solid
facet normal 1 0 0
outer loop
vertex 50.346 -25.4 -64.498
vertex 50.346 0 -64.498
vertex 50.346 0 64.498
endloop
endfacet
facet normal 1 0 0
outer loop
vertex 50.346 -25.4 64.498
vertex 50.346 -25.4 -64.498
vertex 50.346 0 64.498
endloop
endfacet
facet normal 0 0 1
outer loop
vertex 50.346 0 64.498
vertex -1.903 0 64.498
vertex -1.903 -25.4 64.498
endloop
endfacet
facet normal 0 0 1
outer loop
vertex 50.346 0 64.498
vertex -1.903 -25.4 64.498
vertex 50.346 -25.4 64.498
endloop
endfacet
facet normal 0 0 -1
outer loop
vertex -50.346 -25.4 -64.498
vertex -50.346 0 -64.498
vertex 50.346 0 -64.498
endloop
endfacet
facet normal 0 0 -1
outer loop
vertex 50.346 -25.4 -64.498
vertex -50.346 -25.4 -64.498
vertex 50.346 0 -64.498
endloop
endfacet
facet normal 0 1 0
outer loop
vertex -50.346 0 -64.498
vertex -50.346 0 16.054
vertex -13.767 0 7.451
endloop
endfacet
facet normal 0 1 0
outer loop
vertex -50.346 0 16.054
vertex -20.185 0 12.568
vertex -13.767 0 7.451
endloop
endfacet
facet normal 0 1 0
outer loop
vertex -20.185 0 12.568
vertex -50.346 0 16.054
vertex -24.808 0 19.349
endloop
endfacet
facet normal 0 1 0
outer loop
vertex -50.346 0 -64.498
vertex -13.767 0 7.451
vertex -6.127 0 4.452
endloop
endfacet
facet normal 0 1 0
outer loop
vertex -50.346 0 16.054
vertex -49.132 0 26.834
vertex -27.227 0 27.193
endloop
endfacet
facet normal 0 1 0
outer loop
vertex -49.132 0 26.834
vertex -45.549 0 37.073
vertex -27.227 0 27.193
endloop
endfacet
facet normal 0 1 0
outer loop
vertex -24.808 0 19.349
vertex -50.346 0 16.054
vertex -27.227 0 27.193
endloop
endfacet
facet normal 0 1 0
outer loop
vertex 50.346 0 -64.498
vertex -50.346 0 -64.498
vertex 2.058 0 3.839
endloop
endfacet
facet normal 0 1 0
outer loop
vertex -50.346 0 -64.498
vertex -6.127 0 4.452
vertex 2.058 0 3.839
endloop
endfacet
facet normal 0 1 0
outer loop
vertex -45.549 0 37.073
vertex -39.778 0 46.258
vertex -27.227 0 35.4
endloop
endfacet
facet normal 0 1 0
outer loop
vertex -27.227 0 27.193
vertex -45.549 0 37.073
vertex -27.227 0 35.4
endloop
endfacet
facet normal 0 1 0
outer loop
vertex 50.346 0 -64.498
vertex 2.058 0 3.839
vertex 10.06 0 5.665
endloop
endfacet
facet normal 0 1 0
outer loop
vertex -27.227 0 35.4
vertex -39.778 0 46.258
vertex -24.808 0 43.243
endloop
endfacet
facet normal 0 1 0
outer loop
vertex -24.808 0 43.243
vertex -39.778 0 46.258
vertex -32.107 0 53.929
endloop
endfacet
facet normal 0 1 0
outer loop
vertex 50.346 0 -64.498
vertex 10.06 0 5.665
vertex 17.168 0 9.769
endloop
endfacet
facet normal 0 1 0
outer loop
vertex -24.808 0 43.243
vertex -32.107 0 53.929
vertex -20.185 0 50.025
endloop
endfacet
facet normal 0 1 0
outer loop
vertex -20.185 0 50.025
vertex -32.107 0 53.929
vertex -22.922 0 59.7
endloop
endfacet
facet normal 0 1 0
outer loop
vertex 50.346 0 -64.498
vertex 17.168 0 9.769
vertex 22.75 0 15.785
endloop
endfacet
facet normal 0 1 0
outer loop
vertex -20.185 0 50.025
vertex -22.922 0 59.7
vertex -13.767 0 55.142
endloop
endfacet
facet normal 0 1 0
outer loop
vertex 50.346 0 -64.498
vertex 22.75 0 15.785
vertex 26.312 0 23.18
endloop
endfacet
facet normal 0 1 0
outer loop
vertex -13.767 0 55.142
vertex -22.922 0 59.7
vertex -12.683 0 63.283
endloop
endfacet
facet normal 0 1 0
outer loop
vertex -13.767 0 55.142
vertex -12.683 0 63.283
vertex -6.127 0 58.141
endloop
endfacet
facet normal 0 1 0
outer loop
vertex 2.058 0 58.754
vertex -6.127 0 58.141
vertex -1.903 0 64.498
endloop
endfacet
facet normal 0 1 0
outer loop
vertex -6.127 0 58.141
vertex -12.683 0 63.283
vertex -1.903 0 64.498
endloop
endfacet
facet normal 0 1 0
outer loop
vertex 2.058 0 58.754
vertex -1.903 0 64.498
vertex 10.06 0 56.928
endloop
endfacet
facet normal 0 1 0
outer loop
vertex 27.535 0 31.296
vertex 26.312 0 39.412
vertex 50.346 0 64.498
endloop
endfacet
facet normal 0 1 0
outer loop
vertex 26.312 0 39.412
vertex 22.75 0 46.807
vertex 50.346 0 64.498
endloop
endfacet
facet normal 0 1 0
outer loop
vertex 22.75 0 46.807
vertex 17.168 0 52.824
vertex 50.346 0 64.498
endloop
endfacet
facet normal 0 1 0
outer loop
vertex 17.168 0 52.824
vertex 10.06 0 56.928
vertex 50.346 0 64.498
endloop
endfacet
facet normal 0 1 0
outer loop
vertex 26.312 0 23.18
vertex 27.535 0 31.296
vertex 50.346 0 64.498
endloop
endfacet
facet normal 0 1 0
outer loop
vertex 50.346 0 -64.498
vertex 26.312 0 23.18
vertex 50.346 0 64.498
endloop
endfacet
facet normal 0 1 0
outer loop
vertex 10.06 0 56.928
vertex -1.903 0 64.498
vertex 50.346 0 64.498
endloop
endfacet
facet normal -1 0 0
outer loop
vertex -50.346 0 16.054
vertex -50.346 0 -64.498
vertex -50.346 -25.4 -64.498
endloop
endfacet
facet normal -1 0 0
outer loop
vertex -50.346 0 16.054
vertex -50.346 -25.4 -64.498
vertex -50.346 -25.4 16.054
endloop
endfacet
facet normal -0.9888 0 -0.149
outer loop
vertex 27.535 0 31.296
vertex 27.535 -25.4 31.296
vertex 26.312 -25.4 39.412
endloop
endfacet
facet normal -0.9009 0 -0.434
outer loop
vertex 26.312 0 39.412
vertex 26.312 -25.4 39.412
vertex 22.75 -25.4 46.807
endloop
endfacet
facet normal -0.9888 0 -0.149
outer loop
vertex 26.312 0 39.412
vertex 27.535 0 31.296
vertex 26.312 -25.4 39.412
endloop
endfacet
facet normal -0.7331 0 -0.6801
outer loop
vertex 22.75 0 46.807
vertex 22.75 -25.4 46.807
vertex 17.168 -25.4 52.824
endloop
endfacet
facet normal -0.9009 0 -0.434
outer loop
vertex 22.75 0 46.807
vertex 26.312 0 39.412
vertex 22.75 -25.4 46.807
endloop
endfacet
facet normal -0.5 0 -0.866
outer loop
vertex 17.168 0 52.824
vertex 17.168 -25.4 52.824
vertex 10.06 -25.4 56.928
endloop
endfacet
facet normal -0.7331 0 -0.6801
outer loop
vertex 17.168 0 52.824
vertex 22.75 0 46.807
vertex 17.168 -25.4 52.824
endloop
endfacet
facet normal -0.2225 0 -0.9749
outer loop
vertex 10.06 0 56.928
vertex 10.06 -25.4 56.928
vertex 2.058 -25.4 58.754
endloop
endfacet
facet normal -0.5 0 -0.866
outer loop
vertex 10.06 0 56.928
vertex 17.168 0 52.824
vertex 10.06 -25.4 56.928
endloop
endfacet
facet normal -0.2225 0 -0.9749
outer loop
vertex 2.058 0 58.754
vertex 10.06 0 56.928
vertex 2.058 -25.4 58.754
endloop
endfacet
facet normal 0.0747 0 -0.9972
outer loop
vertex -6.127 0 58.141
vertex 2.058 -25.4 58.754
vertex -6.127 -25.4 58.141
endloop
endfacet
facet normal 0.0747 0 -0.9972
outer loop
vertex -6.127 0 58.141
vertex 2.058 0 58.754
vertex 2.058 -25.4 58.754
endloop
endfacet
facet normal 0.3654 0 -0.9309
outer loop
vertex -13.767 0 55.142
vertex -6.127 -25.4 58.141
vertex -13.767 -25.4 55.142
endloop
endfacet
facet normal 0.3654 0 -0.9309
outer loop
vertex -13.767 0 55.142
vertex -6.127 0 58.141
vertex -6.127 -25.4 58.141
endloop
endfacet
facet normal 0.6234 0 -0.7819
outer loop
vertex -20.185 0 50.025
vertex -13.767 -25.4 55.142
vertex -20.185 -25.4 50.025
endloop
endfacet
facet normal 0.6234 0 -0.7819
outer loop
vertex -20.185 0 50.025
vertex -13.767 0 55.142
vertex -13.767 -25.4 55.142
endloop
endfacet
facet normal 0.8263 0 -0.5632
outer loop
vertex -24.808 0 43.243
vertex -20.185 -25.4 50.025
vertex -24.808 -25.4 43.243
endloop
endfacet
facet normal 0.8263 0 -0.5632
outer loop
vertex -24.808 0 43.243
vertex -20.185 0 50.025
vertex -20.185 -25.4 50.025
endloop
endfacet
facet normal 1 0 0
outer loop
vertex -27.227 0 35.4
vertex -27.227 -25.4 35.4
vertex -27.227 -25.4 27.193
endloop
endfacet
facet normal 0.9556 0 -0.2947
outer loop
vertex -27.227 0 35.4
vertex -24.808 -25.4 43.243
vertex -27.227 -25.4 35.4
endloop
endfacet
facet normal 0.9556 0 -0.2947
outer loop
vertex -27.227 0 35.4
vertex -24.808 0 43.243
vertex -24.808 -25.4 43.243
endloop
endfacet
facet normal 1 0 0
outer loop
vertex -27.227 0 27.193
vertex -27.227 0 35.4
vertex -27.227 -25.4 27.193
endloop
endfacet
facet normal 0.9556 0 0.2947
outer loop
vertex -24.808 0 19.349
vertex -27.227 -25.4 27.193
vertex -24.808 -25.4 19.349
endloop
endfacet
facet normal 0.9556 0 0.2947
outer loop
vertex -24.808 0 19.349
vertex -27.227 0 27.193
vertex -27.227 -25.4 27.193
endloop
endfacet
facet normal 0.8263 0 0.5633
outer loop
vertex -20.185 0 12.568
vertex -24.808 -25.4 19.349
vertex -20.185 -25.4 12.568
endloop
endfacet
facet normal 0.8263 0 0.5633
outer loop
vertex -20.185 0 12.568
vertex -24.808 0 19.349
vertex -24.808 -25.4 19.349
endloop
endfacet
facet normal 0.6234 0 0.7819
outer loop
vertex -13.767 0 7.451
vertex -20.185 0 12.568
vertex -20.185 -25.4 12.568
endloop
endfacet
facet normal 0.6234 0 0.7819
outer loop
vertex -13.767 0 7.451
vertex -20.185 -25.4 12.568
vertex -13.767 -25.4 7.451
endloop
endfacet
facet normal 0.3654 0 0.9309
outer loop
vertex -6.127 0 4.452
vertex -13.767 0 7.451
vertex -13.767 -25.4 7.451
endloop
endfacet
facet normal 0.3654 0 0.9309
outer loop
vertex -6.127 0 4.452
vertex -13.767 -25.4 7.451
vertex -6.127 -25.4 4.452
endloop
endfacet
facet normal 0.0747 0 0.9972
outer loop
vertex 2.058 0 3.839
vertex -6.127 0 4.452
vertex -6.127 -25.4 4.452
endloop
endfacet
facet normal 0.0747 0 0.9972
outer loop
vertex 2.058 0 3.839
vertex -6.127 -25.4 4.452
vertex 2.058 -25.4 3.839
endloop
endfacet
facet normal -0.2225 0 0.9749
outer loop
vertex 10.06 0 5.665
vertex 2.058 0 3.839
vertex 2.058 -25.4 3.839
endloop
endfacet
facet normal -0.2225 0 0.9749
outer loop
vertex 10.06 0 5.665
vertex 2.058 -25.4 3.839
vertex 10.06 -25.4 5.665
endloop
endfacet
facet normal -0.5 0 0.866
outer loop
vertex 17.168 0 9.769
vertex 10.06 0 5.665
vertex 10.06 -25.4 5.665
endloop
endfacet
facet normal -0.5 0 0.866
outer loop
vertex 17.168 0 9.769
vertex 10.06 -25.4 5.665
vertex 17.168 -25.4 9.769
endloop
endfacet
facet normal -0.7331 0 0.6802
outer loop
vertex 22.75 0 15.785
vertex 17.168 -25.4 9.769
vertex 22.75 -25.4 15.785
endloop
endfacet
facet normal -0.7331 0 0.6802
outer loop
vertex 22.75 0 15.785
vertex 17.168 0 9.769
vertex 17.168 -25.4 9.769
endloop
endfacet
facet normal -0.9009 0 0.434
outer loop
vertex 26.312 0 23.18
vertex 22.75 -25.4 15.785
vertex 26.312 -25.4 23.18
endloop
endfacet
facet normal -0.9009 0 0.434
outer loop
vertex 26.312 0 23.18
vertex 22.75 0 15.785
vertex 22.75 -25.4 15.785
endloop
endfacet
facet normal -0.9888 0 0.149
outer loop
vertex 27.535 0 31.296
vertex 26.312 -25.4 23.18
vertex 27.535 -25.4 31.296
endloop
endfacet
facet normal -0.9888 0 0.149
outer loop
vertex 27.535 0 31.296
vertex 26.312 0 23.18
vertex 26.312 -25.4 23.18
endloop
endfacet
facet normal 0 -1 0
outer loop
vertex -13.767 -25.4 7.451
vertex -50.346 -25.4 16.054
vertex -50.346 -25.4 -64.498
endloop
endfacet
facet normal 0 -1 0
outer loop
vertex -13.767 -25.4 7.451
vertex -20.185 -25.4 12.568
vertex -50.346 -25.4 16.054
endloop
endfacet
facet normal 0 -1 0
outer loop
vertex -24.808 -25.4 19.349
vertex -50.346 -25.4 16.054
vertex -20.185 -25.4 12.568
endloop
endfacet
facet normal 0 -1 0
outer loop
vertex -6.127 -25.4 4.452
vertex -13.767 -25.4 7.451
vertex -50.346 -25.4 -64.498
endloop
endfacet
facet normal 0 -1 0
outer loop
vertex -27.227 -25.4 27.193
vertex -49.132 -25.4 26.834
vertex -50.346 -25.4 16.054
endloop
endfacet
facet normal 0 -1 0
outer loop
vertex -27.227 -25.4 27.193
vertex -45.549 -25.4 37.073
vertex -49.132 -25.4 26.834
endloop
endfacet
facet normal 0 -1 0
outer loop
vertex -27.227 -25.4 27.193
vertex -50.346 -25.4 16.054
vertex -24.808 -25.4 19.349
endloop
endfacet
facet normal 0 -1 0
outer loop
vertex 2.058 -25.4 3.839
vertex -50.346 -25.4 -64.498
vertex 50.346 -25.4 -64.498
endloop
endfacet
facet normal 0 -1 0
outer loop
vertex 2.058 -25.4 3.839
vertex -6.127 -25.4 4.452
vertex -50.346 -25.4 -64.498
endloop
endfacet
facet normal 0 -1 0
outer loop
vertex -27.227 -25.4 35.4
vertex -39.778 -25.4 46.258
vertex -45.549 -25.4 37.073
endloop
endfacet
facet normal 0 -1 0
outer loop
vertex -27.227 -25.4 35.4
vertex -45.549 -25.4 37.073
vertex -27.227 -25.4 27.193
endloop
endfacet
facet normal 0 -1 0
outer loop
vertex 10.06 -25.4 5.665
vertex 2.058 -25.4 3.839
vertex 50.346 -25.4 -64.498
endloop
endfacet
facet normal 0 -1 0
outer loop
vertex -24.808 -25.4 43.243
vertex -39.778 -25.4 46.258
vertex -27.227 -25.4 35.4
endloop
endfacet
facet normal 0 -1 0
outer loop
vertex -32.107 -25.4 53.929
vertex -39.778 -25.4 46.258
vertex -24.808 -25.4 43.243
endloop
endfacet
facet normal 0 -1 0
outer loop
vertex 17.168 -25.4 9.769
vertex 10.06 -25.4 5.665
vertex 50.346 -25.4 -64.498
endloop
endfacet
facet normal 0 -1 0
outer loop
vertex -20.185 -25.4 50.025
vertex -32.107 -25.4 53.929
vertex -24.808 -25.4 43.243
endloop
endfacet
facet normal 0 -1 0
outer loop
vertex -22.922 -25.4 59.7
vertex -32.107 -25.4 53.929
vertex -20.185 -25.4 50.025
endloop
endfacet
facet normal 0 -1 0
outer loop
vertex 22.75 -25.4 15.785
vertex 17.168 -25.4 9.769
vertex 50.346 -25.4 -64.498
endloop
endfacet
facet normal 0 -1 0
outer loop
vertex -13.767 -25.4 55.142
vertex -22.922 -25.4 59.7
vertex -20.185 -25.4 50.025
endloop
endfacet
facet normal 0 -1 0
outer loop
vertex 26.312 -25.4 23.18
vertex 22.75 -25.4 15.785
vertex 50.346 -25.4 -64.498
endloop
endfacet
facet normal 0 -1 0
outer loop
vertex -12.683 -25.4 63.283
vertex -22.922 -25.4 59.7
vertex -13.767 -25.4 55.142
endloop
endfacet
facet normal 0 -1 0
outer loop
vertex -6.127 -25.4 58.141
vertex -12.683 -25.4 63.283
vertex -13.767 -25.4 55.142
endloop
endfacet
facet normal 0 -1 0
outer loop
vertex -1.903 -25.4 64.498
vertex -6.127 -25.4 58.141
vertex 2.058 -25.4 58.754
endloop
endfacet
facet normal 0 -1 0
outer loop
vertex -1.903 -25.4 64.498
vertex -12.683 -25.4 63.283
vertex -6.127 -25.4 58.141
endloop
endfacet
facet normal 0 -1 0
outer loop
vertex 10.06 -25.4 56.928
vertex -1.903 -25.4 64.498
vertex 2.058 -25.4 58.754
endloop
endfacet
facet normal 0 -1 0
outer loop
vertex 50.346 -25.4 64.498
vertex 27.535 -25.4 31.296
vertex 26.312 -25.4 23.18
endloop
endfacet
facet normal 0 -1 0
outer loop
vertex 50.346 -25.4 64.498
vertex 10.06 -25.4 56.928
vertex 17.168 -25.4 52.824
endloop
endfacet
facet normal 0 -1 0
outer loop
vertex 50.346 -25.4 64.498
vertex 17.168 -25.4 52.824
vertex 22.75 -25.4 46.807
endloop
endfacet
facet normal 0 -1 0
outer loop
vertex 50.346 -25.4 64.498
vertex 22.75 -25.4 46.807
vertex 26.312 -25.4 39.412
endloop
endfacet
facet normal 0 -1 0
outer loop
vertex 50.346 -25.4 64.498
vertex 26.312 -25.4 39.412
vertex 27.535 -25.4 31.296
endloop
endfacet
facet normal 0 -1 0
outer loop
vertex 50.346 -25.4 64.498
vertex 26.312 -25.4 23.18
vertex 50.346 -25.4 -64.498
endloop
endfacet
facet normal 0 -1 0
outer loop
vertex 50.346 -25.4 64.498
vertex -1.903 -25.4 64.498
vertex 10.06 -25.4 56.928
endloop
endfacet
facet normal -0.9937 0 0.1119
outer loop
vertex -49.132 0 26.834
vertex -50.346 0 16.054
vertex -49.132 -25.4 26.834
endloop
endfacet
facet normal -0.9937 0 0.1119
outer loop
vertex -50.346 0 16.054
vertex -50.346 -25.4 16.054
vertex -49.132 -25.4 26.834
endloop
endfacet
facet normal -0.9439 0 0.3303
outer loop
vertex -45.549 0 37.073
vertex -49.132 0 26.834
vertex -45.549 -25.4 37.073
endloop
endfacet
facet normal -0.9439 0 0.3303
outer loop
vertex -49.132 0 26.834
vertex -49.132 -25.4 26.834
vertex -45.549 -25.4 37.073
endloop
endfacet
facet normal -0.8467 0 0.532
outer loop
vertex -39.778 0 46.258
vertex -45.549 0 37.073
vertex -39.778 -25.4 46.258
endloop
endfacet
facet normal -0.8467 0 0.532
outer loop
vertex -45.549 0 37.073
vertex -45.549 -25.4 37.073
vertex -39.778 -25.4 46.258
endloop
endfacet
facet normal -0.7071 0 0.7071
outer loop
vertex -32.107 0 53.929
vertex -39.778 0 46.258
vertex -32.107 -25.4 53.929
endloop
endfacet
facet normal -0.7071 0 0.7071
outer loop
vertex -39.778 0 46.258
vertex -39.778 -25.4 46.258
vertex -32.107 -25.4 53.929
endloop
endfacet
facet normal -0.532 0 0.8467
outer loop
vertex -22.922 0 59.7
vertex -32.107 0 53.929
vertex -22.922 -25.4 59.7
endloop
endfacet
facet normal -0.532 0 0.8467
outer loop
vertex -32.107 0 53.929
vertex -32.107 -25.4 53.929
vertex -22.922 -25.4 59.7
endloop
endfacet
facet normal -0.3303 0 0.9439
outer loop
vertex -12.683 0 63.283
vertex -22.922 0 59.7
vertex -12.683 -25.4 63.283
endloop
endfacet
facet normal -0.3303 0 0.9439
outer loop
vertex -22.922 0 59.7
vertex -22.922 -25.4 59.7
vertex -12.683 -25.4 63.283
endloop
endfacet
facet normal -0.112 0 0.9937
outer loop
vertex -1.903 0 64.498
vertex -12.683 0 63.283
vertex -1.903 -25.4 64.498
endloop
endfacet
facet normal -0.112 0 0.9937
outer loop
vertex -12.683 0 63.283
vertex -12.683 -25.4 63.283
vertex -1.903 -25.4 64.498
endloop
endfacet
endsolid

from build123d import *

# Parameters (mm, degrees)
F0_W     = 100.692854
F0_H     = 128.995716
F1_DEPTH = 25.4
F2_R     = 27.534887
F3_DEPTH = 170.942
F4_R     = 48.443609


with BuildPart() as f1:
    # F0 (on Front) → F1 (new body)
    with BuildSketch(Plane.XZ):
        Rectangle(F0_W, F0_H)
    extrude(amount=F1_DEPTH)

    # F2 (on Front) → F3 (cut)
    with BuildSketch(Plane.XZ):
        with Locations((0, 31.296428)):
            Circle(F2_R)
    extrude(amount=F3_DEPTH, mode=Mode.SUBTRACT)

    # F4
    f4_edges = [f1.edges().sort_by_distance(p)[0] for p in [
        (-50.346427, -12.7, 64.497858),
    ]]
    fillet(f4_edges, radius=F4_R)


solid = f1.part
